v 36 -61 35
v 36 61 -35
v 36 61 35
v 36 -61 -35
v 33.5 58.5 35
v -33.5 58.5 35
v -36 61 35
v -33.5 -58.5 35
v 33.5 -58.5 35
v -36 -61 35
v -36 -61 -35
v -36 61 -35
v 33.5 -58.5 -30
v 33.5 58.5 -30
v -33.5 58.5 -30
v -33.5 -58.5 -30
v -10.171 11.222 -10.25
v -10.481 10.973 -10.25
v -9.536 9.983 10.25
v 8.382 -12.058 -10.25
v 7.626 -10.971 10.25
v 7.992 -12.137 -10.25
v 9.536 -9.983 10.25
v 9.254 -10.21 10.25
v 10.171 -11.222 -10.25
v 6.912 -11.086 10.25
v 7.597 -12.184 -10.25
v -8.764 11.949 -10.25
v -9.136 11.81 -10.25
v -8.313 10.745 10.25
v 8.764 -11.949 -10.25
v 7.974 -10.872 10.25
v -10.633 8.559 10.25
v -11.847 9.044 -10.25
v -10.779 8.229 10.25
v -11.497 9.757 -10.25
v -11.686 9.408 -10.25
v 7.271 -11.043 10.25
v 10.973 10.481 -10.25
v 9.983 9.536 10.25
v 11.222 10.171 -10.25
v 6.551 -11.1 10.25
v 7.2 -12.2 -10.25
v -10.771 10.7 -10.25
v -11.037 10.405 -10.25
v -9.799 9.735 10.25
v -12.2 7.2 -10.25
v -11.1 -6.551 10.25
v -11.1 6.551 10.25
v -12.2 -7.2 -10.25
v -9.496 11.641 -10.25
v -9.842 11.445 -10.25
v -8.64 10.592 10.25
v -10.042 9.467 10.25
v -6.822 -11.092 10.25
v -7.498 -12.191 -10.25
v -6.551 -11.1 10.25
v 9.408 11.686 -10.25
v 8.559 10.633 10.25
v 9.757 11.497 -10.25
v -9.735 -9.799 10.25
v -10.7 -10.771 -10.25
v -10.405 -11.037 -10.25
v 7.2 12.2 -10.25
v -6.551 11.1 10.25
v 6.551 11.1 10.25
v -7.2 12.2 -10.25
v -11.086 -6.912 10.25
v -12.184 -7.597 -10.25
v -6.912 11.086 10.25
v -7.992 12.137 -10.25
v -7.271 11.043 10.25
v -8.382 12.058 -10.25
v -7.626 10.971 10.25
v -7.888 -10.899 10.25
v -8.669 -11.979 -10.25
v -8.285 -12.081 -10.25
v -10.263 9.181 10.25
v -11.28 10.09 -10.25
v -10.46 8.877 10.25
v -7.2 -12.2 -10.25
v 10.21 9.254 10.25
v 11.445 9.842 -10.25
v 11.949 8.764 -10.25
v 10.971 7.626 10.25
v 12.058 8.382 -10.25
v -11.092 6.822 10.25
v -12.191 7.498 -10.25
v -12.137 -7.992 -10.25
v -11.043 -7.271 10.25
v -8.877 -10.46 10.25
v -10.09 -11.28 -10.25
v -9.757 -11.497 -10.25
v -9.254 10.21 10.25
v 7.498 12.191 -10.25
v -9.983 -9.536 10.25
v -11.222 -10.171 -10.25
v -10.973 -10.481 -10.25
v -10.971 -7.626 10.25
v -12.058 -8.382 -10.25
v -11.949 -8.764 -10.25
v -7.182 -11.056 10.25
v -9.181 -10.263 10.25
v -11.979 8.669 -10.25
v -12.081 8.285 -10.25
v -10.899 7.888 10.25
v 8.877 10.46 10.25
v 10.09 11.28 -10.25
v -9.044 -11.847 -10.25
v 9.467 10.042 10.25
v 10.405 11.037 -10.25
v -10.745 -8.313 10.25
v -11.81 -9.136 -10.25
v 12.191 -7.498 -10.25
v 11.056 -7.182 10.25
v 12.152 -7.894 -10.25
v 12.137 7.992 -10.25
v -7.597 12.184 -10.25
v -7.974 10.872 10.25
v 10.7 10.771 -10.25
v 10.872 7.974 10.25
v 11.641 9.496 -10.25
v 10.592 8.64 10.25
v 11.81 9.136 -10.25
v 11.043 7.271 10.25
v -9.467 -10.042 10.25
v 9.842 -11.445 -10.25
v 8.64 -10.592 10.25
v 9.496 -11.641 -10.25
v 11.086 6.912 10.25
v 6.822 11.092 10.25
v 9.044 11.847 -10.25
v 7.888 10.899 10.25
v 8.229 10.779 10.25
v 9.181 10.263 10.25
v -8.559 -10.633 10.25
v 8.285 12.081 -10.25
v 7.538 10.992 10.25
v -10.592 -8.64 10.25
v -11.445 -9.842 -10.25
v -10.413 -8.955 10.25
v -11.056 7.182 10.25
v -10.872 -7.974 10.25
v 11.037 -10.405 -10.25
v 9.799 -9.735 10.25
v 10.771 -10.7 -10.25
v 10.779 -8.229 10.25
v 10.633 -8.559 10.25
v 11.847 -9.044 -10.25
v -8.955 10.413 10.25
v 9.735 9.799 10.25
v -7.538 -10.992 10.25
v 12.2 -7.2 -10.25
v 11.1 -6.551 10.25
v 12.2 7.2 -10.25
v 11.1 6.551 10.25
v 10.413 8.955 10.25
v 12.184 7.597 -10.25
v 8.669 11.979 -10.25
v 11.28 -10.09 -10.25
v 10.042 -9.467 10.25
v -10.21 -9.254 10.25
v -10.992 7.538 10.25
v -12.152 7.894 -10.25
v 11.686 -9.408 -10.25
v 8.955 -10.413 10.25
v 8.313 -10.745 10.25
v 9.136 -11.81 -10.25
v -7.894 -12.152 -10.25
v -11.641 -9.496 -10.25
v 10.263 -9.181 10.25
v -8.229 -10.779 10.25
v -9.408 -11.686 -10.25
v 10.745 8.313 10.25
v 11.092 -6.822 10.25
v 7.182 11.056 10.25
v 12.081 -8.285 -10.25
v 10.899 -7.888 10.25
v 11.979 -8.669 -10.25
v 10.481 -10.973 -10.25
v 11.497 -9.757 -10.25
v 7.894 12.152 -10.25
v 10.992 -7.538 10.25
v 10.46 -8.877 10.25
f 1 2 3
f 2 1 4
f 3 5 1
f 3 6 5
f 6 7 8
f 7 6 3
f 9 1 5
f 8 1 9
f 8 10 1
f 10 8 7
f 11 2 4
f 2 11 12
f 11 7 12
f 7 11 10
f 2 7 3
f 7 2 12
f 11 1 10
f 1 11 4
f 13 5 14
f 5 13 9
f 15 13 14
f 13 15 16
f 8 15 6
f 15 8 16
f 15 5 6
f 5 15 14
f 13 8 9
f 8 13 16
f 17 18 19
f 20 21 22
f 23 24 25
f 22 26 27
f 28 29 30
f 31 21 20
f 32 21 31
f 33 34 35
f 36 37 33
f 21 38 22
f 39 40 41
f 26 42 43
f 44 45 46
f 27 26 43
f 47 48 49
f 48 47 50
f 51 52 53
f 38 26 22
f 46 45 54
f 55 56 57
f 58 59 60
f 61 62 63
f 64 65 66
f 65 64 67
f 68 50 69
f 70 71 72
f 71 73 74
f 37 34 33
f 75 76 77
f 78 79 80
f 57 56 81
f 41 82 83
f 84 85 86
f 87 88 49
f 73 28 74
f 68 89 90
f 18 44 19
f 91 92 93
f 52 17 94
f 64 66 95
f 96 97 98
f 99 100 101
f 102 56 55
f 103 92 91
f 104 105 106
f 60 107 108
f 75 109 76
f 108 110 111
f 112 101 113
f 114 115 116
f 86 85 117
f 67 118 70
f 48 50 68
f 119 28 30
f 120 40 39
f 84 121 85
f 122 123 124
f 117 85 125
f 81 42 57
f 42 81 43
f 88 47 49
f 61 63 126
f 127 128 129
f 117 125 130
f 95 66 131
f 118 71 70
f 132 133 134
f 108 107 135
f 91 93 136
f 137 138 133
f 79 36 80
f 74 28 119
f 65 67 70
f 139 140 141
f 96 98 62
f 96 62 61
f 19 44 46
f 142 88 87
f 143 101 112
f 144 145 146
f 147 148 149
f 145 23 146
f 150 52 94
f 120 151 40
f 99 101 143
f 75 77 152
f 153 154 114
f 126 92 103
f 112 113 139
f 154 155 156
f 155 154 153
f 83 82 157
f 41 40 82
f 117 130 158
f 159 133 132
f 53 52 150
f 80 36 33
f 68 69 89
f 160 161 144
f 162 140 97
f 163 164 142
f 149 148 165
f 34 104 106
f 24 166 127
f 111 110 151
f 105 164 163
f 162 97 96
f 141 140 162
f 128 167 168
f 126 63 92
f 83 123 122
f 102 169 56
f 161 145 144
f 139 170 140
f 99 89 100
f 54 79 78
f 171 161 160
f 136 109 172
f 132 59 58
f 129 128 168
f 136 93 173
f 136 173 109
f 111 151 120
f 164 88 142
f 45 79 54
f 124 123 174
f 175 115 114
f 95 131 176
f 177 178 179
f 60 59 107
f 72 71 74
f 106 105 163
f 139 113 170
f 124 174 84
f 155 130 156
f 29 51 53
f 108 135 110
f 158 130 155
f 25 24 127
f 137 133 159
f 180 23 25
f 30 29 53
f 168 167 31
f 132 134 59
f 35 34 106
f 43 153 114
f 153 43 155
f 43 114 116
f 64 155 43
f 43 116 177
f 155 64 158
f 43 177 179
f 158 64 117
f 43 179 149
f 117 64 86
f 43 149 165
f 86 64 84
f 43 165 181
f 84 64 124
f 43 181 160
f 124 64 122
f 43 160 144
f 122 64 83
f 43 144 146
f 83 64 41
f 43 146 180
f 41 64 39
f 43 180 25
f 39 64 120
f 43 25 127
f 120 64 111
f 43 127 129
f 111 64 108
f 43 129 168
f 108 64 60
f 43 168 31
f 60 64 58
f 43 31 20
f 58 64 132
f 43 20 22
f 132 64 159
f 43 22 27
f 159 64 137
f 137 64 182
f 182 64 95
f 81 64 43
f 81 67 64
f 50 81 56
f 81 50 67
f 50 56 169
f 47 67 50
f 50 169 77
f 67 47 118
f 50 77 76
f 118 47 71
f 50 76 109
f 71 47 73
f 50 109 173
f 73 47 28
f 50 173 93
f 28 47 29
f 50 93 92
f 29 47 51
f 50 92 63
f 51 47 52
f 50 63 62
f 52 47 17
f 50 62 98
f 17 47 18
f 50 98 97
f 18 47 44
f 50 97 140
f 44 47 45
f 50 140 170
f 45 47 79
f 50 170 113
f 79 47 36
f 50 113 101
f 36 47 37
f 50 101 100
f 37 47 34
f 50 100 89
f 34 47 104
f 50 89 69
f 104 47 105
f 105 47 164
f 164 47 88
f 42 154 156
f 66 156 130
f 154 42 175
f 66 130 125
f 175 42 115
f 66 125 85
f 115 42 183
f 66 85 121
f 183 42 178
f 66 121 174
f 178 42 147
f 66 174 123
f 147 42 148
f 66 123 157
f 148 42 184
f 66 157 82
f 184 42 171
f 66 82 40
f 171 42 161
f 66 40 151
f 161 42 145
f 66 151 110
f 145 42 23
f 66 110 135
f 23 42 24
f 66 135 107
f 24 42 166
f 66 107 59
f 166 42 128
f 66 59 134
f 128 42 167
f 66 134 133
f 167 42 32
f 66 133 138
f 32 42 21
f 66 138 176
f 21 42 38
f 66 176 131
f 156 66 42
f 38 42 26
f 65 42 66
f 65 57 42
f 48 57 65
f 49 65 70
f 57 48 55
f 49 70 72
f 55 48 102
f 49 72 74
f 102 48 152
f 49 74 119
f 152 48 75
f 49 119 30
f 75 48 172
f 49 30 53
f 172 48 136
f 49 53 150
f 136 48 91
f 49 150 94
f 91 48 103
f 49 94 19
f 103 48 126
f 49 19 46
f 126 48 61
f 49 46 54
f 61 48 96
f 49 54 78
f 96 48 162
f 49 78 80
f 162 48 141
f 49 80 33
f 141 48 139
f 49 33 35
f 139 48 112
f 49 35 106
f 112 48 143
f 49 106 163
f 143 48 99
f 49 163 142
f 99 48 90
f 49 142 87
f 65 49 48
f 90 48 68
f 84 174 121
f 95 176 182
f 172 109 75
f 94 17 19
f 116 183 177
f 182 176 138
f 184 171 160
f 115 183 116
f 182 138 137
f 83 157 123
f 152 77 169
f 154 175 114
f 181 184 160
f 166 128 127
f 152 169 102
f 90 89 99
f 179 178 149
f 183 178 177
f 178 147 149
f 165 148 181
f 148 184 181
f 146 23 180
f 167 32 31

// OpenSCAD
// file: photon_platform_adapter.scad
// definitions
$fa = 1;
$fs = 0.4;

fillet = 5;

diff = 1.1;
a = 24.8-0.4;
b = a-2*diff;
h = 20.5;

d1 = 17.54;
d2 = 15.98;

// set up modules
module adapter() {
    linear_extrude(h, center = true, scale = b/a)
        offset(r = +fillet) offset(delta = -fillet) {
            square(a, center = true);
        }
}

// build model
difference() {
    adapter();

    scale([0.95, 0.95, 1])
    translate([0, 0, -5])
    adapter();
}
// main file
// load libs
use <photon_platform_adapter.scad>

// definitions
$fa = 1;
$fs = 0.4;

pl_width = 65+2; // build plate dimensions
pl_length = 115+2;

depth = 70; // wash box depth

offset = 5;

// set up modules
module tank() {
	difference() {
    cube([pl_width+offset, pl_length+offset, depth],
    center = true);
    
    translate([0, 0, offset])
    cube([pl_width, pl_length, depth],
    center = true);
    }
}

// build model

tank();
adapter();
